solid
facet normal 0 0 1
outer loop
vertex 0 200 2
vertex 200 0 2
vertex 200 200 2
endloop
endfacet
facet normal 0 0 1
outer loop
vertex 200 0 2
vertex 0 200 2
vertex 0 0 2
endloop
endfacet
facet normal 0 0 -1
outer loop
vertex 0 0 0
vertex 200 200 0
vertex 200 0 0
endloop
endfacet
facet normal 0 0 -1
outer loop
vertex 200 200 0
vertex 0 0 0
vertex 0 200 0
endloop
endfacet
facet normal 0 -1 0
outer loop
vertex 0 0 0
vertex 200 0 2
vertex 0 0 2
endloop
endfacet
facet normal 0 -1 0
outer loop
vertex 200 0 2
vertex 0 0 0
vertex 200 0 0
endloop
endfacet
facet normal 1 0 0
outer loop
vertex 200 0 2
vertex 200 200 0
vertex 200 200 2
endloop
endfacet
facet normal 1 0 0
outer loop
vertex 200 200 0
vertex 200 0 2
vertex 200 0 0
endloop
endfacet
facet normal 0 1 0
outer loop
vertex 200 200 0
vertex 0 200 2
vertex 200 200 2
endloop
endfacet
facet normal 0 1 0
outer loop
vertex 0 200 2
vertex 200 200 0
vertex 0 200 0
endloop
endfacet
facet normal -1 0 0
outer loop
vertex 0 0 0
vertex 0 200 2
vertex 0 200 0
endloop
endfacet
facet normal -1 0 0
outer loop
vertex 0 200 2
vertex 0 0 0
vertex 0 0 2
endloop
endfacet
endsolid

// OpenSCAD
$fn = 64;

length = 200;
width  = 200;
thickness = 2;

cube([length, width, thickness], center = false);
